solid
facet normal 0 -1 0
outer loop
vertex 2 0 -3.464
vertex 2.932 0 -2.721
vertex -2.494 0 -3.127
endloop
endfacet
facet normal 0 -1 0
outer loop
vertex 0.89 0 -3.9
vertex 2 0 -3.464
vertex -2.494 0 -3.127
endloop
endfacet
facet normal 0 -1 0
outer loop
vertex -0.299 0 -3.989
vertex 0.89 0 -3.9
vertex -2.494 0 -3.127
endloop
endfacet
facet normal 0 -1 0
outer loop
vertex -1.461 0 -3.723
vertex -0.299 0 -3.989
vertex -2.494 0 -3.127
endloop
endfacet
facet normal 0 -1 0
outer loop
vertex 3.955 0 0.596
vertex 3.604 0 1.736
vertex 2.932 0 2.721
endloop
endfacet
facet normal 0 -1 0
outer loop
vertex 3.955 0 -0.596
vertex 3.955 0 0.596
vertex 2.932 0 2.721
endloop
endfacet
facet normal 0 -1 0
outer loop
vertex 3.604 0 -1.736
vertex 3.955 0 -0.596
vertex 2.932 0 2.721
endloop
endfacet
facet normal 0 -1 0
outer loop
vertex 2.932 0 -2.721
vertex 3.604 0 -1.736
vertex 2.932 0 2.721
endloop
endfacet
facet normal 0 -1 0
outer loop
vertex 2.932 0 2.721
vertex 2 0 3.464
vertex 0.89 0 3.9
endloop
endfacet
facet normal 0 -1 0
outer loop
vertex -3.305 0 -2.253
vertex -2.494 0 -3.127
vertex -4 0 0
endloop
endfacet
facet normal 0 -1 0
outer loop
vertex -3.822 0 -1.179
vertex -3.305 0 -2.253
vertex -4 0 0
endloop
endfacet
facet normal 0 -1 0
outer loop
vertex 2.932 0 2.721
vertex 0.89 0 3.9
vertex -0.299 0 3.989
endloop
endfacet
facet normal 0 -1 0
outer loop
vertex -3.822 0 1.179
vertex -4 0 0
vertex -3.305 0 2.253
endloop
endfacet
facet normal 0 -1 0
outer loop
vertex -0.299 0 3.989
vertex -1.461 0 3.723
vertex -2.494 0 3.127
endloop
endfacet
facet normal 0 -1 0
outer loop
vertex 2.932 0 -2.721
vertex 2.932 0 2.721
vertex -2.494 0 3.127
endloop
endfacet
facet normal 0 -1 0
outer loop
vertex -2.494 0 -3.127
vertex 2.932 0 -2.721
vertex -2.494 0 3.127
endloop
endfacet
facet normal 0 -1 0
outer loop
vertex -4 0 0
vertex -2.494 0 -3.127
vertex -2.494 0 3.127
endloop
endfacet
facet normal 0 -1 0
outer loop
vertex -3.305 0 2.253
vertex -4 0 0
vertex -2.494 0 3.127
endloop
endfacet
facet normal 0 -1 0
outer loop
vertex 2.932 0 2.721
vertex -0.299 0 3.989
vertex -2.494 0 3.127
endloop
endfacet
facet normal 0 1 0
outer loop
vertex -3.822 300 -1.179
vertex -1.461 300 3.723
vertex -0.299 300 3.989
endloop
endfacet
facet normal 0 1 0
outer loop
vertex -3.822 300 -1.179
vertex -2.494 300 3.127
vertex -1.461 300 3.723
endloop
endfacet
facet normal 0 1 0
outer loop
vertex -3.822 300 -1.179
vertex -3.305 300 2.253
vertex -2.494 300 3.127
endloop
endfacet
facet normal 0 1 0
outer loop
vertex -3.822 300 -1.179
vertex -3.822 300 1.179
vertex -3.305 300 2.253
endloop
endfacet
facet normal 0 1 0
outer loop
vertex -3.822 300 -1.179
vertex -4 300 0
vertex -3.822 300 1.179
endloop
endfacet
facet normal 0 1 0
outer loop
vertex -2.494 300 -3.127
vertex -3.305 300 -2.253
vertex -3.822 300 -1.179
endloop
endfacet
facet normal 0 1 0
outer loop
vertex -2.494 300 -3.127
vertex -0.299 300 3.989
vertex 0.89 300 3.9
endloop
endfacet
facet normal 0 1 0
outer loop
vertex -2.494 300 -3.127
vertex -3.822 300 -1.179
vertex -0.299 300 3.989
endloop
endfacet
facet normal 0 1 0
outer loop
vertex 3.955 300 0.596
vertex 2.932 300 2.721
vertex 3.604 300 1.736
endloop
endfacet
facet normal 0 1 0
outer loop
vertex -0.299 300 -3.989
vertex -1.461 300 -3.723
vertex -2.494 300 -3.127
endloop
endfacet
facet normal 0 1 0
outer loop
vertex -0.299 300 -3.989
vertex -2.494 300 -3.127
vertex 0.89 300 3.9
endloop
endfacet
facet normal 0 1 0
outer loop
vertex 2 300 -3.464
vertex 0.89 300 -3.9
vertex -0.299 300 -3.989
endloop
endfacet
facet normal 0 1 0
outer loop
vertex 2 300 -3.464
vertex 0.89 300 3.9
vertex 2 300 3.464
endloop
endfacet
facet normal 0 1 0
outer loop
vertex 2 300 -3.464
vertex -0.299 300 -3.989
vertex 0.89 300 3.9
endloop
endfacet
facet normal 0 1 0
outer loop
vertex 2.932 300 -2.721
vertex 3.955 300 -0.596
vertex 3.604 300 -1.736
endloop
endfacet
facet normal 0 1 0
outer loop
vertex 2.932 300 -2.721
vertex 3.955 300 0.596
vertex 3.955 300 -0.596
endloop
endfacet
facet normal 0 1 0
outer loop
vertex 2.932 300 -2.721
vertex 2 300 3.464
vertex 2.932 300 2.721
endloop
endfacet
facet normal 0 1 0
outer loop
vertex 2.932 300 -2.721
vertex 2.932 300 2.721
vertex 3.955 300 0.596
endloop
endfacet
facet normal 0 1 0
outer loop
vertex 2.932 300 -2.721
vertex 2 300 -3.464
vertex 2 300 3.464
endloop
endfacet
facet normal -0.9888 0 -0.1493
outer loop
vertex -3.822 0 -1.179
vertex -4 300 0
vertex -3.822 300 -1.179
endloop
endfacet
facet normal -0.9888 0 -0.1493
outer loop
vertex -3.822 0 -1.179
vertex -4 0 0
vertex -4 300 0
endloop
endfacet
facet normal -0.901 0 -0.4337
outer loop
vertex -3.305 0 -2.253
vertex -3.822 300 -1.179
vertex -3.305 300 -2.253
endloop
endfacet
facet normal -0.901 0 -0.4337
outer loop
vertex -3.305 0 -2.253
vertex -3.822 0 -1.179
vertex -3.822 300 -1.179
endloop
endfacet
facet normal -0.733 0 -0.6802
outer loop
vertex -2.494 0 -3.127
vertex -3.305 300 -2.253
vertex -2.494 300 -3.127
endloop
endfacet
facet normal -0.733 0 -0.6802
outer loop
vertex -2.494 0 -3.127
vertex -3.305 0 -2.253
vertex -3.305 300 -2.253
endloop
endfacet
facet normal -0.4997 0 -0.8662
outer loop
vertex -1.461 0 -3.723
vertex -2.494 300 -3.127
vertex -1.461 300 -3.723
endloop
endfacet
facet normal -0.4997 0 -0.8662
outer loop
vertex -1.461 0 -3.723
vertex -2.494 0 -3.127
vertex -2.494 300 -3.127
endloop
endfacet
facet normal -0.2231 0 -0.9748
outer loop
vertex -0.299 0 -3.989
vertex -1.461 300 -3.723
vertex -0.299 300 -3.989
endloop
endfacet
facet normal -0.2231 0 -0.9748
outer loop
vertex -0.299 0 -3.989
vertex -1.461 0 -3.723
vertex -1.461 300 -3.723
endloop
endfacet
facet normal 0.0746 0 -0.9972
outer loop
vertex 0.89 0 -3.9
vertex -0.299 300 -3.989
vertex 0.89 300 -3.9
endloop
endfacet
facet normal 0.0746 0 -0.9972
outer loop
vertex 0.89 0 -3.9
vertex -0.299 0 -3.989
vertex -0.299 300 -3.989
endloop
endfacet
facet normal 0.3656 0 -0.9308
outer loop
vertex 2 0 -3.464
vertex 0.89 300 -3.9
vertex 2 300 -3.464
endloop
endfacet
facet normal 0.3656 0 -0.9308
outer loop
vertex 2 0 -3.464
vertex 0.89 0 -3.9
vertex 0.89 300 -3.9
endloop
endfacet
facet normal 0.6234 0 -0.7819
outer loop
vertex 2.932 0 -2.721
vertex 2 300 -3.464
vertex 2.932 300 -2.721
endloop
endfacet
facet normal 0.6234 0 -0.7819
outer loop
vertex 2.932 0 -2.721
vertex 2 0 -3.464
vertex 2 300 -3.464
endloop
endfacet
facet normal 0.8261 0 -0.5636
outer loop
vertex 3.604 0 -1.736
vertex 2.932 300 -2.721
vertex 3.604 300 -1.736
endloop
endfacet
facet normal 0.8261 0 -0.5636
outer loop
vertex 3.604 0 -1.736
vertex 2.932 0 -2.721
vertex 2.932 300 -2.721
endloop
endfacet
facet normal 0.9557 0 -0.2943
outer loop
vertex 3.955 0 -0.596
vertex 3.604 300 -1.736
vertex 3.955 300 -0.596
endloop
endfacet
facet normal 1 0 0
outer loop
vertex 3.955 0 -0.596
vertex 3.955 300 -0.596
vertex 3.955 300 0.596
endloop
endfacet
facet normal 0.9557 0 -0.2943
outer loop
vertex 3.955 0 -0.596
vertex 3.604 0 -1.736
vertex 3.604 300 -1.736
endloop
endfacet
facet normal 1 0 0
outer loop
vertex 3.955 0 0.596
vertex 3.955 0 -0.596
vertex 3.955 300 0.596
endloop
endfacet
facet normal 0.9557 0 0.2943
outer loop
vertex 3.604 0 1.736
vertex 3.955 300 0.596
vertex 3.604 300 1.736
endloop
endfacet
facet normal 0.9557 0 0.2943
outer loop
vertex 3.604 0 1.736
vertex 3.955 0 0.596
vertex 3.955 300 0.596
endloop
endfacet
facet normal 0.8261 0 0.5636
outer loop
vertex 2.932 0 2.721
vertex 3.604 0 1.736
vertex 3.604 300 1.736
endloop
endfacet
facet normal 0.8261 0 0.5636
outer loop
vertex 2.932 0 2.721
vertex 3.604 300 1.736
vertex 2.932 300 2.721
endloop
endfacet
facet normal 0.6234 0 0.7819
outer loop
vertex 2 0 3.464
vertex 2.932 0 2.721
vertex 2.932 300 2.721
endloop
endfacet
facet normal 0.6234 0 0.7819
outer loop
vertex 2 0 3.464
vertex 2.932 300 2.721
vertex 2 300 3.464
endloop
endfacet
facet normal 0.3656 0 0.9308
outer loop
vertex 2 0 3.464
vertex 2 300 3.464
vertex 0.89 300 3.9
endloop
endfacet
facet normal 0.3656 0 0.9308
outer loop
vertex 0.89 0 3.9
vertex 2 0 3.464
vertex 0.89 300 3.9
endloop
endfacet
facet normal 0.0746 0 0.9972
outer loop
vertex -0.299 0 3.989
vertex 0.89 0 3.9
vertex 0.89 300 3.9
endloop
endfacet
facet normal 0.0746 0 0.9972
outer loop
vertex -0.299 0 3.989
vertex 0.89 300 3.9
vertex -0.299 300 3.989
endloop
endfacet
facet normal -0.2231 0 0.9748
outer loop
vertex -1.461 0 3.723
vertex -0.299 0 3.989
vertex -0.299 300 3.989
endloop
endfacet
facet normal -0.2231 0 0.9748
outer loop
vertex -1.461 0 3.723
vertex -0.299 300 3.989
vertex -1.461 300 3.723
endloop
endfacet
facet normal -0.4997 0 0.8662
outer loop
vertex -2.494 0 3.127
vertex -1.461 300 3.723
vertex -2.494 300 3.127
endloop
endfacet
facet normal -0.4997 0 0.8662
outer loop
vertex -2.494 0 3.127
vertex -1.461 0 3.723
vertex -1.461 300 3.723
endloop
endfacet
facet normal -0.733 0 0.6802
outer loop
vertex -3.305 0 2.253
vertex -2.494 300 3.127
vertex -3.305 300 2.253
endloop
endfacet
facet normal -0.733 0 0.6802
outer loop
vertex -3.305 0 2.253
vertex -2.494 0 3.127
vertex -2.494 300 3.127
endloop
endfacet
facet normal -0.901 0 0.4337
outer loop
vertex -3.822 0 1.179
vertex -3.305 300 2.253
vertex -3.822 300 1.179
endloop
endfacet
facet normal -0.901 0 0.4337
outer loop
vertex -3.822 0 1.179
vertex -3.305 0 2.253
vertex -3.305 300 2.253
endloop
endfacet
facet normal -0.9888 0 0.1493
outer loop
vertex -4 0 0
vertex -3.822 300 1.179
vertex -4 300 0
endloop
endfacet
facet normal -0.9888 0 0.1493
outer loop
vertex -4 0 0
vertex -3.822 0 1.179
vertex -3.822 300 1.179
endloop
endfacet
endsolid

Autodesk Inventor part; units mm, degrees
ref_plane "YZ Plane" through (0, 0, 0) normal (1, 0, 0) x (0, 1, 0)
ref_plane "XZ Plane" through (0, 0, 0) normal (0, 1, 0) x (-1, 0, 0)
ref_plane "XY Plane" through (0, 0, 0) normal (0, 0, 1) x (1, 0, 0)
sketch "Boceto1" plane through (0, 0, 0) normal (0, 1, 0) x (-1, 0, 0)
  circle A0 centre (0, 0) radius 4
  dimension "d0" = 8
extrude "Extrusión1" add sketch "Boceto1" along normal blind 400
thread "Rosca1" size "M8x1.25" class "6g" standard "ISO Metric profile" full length
sketch "Boceto2" plane through (0, 400, 0) normal (0, 1, 0) x (1, 0, 0)
  circle A0 centre (0, 0) radius 4
extrude "Extrusión2" cut sketch "Boceto2" against normal blind 23
sketch "Boceto3" plane through (0, 377, 0) normal (0, 1, 0) x (1, 0, 0)
  circle A0 centre (0, 0) radius 4
extrude "Extrusión3" cut sketch "Boceto3" against normal blind 77
properties part number "tornillo"
